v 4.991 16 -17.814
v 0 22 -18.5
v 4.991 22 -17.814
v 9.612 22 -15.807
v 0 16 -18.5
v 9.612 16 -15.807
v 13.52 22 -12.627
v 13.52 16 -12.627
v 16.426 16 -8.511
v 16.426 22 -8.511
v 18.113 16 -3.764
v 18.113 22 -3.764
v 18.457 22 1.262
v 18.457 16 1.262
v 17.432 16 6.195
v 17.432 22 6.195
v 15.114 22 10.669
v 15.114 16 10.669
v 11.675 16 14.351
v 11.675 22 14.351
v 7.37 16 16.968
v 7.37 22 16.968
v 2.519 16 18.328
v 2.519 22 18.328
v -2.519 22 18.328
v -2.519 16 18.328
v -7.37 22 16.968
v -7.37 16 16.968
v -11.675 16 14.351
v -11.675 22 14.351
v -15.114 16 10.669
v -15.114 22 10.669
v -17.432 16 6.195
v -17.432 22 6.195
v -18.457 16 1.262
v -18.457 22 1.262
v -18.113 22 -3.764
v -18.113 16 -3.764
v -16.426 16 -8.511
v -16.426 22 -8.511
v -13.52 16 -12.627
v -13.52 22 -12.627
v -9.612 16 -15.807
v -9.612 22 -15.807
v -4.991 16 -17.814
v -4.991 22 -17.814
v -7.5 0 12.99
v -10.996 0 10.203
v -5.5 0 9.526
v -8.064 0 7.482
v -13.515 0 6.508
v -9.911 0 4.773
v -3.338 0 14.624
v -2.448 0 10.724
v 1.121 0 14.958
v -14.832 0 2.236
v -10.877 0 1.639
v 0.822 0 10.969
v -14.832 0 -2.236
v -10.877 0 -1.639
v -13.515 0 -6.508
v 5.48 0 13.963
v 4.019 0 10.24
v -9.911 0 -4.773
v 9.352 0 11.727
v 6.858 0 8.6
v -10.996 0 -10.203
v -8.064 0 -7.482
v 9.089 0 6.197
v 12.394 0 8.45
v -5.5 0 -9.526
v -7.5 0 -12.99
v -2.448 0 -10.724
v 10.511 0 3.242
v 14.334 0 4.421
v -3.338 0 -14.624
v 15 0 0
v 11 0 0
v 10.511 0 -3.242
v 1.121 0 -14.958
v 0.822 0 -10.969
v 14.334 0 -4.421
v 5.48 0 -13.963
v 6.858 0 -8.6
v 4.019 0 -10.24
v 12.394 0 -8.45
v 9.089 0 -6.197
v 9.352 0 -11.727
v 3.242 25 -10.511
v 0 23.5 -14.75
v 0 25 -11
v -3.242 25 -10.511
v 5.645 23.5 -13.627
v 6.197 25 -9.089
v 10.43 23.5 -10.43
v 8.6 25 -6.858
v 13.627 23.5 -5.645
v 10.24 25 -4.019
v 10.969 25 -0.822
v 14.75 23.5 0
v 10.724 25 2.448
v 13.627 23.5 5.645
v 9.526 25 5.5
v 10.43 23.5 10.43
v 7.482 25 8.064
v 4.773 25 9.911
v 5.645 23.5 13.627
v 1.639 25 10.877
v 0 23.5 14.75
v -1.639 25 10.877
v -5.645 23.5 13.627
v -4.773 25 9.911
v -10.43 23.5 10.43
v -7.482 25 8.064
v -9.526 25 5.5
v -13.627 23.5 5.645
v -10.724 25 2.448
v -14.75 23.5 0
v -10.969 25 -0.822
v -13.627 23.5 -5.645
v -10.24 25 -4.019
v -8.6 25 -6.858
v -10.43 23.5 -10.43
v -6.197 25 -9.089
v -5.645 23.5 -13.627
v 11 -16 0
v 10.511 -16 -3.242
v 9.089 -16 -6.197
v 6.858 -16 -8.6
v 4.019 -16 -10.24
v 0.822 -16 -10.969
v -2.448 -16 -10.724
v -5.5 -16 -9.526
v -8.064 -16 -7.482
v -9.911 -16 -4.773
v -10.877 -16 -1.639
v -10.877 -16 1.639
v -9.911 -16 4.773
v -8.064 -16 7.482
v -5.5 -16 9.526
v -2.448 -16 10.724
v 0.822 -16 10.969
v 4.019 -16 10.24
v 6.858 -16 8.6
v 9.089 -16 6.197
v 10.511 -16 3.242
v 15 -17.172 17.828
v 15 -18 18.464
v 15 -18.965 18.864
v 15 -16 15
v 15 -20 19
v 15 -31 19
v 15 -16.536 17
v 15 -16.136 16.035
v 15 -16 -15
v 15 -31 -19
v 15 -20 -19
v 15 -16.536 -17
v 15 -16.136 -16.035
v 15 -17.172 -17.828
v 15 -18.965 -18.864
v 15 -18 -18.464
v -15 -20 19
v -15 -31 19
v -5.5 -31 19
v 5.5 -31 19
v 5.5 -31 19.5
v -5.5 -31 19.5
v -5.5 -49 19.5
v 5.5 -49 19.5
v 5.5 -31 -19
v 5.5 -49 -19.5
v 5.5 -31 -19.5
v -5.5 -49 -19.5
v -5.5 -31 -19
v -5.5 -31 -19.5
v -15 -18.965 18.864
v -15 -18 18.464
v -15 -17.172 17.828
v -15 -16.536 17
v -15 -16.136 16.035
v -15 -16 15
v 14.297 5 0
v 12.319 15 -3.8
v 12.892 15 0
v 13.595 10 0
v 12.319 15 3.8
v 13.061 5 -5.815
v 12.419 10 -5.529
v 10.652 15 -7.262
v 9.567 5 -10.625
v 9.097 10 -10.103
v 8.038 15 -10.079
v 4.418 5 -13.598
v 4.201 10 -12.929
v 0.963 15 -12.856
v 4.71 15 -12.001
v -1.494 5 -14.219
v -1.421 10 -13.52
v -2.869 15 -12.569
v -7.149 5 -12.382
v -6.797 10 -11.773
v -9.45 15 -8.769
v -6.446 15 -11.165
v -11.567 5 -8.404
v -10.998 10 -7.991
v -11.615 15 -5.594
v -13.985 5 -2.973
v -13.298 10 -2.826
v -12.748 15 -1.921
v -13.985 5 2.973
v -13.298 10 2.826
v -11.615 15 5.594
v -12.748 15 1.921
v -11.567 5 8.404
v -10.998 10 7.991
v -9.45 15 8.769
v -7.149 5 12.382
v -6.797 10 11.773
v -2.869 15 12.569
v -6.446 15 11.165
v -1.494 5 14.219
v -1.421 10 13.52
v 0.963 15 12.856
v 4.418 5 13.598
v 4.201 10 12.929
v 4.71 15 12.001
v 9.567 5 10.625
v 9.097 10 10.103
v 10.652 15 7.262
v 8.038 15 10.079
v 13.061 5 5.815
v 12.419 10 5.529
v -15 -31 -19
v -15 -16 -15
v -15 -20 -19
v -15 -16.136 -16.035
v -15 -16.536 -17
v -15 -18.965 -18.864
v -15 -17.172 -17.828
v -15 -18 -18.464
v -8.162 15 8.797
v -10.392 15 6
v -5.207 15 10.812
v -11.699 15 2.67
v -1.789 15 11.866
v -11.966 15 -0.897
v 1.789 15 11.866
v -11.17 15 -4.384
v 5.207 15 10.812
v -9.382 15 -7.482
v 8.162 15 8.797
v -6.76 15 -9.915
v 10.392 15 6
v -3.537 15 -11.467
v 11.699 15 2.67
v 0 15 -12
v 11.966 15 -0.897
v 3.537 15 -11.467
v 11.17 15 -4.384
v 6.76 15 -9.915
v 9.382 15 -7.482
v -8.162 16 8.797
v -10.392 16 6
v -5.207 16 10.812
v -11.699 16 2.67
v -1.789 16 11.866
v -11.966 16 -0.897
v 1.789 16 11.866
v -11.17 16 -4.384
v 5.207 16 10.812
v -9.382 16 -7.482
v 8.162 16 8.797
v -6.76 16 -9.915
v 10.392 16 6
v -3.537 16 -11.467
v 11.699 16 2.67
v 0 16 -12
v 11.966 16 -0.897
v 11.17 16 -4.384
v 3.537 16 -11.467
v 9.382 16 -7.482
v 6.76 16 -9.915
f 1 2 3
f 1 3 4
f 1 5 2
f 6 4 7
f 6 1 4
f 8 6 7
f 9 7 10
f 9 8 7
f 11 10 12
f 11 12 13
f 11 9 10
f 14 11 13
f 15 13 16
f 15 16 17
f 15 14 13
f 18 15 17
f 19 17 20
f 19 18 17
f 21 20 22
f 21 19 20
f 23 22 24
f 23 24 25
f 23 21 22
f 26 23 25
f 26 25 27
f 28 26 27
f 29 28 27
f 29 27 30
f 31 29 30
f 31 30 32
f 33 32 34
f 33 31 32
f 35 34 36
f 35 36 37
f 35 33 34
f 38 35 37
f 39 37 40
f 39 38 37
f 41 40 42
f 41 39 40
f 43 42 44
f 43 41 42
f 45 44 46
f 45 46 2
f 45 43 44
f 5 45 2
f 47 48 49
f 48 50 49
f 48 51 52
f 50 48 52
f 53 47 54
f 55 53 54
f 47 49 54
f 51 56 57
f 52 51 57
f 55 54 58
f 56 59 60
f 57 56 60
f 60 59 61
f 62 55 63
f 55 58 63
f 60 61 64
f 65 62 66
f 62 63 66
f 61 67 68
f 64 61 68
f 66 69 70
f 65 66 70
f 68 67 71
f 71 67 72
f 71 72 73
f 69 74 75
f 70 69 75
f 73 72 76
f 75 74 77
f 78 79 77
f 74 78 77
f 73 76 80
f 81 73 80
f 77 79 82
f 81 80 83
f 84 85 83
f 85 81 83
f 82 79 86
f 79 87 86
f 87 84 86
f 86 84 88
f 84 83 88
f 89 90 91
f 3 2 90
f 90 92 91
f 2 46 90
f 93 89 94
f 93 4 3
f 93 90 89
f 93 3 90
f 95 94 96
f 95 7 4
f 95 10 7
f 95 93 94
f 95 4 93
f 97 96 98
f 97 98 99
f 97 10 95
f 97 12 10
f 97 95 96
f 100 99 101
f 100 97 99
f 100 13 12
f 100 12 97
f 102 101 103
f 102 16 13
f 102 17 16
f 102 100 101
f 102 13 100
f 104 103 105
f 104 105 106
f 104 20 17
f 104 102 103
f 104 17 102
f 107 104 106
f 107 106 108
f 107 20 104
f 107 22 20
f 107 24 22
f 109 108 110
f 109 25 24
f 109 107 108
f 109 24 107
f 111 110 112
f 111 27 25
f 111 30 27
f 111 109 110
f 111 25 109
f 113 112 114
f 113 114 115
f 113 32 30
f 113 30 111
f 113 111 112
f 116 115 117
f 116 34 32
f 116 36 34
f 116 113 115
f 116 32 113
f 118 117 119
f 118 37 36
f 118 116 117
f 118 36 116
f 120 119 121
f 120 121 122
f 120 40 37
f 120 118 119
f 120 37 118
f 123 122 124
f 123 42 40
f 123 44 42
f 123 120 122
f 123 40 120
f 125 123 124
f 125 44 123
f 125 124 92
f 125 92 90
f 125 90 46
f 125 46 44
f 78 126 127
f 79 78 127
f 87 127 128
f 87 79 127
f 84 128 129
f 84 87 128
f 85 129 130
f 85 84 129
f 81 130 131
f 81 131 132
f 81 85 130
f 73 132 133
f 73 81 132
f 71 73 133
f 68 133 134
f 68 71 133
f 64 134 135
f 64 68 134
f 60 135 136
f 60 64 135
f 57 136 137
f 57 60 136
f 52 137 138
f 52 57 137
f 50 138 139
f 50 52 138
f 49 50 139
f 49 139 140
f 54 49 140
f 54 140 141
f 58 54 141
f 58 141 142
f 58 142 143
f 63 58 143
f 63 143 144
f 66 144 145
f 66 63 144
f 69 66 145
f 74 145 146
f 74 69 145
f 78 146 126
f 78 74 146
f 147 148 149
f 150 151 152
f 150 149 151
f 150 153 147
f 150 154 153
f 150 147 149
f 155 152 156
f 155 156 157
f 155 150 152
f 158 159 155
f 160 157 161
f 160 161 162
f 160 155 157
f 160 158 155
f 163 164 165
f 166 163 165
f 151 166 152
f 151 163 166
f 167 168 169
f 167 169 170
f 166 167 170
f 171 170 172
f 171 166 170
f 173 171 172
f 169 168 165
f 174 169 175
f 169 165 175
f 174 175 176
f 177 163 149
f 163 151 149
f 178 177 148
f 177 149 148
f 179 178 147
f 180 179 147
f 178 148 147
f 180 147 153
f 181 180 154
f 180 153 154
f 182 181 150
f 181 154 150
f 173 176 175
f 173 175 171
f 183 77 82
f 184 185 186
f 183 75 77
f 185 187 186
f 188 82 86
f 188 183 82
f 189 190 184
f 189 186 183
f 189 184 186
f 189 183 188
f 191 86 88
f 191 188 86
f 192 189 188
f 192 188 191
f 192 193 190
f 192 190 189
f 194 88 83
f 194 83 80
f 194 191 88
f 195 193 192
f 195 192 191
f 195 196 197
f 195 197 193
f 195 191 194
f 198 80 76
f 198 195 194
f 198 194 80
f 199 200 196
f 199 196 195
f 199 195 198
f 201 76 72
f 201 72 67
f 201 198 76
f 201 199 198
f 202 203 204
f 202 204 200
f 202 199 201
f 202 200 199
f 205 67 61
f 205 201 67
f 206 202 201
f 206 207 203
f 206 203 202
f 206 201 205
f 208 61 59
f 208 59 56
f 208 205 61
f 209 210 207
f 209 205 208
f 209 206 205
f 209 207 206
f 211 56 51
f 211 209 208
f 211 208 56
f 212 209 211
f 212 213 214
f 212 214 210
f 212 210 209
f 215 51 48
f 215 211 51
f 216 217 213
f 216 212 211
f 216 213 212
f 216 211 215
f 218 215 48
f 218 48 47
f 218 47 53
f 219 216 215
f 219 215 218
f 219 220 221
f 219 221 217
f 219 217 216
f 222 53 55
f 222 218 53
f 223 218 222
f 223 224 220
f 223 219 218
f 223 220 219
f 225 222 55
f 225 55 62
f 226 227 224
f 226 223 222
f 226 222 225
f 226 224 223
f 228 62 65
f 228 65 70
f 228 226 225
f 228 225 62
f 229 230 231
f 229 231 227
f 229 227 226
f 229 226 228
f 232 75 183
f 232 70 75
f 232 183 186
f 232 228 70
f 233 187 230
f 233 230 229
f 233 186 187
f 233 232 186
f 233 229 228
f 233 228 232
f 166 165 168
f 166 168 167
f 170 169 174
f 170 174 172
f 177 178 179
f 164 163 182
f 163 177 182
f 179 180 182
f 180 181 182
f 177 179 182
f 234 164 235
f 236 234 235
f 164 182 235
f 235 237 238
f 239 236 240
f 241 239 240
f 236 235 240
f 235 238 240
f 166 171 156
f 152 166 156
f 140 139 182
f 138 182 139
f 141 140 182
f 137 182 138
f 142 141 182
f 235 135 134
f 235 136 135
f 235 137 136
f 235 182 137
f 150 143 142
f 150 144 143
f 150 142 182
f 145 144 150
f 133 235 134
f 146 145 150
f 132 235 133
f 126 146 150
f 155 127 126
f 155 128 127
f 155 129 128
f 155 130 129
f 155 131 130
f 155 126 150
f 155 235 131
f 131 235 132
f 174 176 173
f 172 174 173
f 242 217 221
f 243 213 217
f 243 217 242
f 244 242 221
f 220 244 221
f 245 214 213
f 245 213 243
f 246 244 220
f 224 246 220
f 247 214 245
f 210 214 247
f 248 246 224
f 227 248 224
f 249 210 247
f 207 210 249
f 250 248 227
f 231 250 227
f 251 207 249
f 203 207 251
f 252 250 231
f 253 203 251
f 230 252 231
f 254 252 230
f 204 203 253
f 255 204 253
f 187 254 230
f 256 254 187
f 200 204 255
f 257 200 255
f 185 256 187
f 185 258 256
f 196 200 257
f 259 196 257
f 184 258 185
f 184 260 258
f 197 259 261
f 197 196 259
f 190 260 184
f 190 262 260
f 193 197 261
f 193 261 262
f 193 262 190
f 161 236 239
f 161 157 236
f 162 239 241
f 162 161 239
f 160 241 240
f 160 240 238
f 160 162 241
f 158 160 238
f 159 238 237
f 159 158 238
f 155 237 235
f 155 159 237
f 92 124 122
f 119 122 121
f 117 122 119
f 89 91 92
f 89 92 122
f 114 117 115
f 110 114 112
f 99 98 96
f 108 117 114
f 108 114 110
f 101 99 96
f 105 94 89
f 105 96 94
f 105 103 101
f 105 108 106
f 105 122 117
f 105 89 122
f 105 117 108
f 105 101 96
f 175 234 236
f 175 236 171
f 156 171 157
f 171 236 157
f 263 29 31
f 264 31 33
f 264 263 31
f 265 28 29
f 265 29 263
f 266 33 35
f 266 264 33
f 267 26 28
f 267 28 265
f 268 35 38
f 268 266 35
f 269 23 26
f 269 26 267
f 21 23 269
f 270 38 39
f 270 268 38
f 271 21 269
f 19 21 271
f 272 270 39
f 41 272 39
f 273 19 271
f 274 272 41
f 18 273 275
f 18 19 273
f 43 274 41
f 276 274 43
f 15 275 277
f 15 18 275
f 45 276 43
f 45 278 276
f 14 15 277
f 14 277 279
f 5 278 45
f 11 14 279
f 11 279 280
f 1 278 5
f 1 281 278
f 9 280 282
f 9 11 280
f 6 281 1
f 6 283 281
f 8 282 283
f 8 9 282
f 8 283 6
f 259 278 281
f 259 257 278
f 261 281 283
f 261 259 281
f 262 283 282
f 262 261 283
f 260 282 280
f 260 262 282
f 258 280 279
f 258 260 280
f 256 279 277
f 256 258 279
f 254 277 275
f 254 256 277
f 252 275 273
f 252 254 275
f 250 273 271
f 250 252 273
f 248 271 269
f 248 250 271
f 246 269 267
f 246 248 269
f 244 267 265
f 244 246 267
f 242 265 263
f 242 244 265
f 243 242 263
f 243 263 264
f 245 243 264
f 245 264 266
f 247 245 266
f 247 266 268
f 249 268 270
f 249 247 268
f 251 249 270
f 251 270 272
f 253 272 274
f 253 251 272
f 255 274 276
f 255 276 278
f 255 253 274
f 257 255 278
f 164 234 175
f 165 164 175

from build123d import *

# Parameters (mm, degrees)
SZKIC1_R                    = 15
DODANIE_WYCI_GNI_CIE1_DEPTH = 15
DODANIE_WYCI_GNI_CIE1_TAPER = 8
SZKIC1_3_R                  = 11
DODANIE_WYCI_GNI_CIE2_DEPTH = 16
DODANIE_WYCI_GNI_CIE3_START = -16
SZKIC1_4_W                  = 30
SZKIC1_4_H                  = 38
DODANIE_WYCI_GNI_CIE3_DEPTH = 15
DODANIE_WYCI_GNI_CIE4_START = -31
SZKIC1_5_W                  = 11
SZKIC1_5_H                  = 39
DODANIE_WYCI_GNI_CIE4_DEPTH = 18
ZAOKR_GLENIE1_R             = 4


with BuildPart() as part:
    # Szkic1 → Dodanie-wyci_gni_cie1 (new body)
    with BuildSketch(Plane(origin=(0, 0, 0), x_dir=(1, 0, 0), z_dir=(0, 1, 0))):
        Circle(SZKIC1_R)
    extrude(amount=DODANIE_WYCI_GNI_CIE1_DEPTH, taper=DODANIE_WYCI_GNI_CIE1_TAPER)

    # Szkic1_3 → Dodanie-wyci_gni_cie2 (add)
    with BuildSketch(Plane(origin=(0, 0, 0), x_dir=(1, 0, 0), z_dir=(0, 1, 0))):
        Circle(SZKIC1_3_R)
    extrude(amount=-DODANIE_WYCI_GNI_CIE2_DEPTH)

    # Szkic1_4 → Dodanie-wyci_gni_cie3 (add)
    with BuildSketch(Plane(origin=(0, 0, 0), x_dir=(1, 0, 0), z_dir=(0, 1, 0)).offset(DODANIE_WYCI_GNI_CIE3_START)):
        Rectangle(SZKIC1_4_W, SZKIC1_4_H)
    extrude(amount=-DODANIE_WYCI_GNI_CIE3_DEPTH)

    # Szkic1_5 → Dodanie-wyci_gni_cie4 (add)
    with BuildSketch(Plane(origin=(0, 0, 0), x_dir=(1, 0, 0), z_dir=(0, 1, 0)).offset(DODANIE_WYCI_GNI_CIE4_START)):
        Rectangle(SZKIC1_5_W, SZKIC1_5_H)
    extrude(amount=-DODANIE_WYCI_GNI_CIE4_DEPTH)

    # Szkic2 → Obr_t1 (revolve)
    with BuildSketch(Plane(origin=(0, 0, 0), x_dir=(0, 0, -1), z_dir=(1, 0, 0))):
        Polygon((0, 15), (0, 25), (11, 25), (18.5, 22), (18.5, 16), (12, 16), (12, 15), align=None)
    revolve(axis=Axis((0, 34.075059211, 0), (0, -1, 0)))

    # Zaokr_glenie1
    zaokr_glenie1_edges = [part.edges().sort_by_distance(p)[0] for p in [
        (0, -16, -19),
        (0, -16, 19),
    ]]
    fillet(zaokr_glenie1_edges, radius=ZAOKR_GLENIE1_R)


solid = part.part
